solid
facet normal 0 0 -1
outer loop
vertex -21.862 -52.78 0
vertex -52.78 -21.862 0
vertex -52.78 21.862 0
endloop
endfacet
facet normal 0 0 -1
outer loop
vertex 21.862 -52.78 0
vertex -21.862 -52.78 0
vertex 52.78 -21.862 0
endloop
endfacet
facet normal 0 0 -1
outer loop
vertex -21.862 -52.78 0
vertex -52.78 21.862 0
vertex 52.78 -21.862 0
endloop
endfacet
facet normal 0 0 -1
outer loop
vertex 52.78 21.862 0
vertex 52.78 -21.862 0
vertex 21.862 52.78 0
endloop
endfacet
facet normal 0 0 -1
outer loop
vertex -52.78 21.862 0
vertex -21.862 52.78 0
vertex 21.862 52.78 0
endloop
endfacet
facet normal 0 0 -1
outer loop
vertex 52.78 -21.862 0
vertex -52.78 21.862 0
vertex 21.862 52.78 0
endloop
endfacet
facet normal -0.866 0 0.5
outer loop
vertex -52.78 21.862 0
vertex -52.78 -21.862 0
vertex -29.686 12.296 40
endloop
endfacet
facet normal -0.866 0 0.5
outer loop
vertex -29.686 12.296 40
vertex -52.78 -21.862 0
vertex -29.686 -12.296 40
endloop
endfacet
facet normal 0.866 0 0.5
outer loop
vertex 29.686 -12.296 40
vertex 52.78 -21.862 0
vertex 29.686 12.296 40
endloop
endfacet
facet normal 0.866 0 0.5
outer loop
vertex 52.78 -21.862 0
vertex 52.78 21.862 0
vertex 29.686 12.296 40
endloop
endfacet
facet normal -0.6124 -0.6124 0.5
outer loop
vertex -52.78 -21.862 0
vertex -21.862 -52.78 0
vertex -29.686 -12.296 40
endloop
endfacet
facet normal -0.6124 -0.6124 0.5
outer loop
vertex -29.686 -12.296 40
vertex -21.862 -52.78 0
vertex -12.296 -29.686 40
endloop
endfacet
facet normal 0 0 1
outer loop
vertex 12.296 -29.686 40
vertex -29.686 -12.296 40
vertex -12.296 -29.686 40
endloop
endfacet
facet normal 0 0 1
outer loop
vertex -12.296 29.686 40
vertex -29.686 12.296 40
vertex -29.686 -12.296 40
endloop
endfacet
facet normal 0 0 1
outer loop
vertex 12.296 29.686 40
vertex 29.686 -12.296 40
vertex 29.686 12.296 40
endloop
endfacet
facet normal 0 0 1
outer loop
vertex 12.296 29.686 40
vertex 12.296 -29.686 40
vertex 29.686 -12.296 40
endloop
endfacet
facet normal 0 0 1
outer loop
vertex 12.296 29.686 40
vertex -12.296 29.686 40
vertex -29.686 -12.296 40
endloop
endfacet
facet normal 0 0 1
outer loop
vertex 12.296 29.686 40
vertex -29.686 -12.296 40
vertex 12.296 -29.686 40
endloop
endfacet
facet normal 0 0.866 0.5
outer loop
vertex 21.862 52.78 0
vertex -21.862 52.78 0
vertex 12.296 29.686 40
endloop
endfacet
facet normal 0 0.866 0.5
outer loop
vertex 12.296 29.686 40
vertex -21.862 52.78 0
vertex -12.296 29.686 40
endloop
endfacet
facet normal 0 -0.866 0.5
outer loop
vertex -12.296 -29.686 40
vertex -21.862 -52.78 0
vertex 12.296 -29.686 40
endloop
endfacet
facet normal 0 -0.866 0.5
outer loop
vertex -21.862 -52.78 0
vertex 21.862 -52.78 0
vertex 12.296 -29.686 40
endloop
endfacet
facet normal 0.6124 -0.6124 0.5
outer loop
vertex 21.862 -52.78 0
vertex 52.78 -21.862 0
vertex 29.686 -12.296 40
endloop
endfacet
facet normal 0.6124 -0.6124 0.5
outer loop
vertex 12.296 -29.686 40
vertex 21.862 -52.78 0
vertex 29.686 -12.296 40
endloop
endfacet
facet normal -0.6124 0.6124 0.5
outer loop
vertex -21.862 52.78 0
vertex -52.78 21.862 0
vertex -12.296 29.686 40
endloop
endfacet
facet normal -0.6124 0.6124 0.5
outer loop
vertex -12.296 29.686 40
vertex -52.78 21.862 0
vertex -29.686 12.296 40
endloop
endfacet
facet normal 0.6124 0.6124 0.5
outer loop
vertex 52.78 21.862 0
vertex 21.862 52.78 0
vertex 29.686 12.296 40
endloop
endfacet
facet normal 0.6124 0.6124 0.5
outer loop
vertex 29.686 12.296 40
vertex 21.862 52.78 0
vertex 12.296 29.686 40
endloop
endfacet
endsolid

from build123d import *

# Parameters (mm, degrees)
RESSALTO_EXTRUS_O1_DEPTH = 40
RESSALTO_EXTRUS_O1_TAPER = 30


with BuildPart() as part:
    # Esboço1 → Ressalto-extrusão1 (new body)
    with BuildSketch(Plane.XY):
        Polygon((52.78, -21.862191822), (52.78, 21.862191822), (21.862191822, 52.78), (-21.862191822, 52.78), (-52.78, 21.862191822), (-52.78, -21.862191822), (-21.862191822, -52.78), (21.862191822, -52.78), align=None)
    extrude(amount=RESSALTO_EXTRUS_O1_DEPTH, taper=RESSALTO_EXTRUS_O1_TAPER)


solid = part.part
